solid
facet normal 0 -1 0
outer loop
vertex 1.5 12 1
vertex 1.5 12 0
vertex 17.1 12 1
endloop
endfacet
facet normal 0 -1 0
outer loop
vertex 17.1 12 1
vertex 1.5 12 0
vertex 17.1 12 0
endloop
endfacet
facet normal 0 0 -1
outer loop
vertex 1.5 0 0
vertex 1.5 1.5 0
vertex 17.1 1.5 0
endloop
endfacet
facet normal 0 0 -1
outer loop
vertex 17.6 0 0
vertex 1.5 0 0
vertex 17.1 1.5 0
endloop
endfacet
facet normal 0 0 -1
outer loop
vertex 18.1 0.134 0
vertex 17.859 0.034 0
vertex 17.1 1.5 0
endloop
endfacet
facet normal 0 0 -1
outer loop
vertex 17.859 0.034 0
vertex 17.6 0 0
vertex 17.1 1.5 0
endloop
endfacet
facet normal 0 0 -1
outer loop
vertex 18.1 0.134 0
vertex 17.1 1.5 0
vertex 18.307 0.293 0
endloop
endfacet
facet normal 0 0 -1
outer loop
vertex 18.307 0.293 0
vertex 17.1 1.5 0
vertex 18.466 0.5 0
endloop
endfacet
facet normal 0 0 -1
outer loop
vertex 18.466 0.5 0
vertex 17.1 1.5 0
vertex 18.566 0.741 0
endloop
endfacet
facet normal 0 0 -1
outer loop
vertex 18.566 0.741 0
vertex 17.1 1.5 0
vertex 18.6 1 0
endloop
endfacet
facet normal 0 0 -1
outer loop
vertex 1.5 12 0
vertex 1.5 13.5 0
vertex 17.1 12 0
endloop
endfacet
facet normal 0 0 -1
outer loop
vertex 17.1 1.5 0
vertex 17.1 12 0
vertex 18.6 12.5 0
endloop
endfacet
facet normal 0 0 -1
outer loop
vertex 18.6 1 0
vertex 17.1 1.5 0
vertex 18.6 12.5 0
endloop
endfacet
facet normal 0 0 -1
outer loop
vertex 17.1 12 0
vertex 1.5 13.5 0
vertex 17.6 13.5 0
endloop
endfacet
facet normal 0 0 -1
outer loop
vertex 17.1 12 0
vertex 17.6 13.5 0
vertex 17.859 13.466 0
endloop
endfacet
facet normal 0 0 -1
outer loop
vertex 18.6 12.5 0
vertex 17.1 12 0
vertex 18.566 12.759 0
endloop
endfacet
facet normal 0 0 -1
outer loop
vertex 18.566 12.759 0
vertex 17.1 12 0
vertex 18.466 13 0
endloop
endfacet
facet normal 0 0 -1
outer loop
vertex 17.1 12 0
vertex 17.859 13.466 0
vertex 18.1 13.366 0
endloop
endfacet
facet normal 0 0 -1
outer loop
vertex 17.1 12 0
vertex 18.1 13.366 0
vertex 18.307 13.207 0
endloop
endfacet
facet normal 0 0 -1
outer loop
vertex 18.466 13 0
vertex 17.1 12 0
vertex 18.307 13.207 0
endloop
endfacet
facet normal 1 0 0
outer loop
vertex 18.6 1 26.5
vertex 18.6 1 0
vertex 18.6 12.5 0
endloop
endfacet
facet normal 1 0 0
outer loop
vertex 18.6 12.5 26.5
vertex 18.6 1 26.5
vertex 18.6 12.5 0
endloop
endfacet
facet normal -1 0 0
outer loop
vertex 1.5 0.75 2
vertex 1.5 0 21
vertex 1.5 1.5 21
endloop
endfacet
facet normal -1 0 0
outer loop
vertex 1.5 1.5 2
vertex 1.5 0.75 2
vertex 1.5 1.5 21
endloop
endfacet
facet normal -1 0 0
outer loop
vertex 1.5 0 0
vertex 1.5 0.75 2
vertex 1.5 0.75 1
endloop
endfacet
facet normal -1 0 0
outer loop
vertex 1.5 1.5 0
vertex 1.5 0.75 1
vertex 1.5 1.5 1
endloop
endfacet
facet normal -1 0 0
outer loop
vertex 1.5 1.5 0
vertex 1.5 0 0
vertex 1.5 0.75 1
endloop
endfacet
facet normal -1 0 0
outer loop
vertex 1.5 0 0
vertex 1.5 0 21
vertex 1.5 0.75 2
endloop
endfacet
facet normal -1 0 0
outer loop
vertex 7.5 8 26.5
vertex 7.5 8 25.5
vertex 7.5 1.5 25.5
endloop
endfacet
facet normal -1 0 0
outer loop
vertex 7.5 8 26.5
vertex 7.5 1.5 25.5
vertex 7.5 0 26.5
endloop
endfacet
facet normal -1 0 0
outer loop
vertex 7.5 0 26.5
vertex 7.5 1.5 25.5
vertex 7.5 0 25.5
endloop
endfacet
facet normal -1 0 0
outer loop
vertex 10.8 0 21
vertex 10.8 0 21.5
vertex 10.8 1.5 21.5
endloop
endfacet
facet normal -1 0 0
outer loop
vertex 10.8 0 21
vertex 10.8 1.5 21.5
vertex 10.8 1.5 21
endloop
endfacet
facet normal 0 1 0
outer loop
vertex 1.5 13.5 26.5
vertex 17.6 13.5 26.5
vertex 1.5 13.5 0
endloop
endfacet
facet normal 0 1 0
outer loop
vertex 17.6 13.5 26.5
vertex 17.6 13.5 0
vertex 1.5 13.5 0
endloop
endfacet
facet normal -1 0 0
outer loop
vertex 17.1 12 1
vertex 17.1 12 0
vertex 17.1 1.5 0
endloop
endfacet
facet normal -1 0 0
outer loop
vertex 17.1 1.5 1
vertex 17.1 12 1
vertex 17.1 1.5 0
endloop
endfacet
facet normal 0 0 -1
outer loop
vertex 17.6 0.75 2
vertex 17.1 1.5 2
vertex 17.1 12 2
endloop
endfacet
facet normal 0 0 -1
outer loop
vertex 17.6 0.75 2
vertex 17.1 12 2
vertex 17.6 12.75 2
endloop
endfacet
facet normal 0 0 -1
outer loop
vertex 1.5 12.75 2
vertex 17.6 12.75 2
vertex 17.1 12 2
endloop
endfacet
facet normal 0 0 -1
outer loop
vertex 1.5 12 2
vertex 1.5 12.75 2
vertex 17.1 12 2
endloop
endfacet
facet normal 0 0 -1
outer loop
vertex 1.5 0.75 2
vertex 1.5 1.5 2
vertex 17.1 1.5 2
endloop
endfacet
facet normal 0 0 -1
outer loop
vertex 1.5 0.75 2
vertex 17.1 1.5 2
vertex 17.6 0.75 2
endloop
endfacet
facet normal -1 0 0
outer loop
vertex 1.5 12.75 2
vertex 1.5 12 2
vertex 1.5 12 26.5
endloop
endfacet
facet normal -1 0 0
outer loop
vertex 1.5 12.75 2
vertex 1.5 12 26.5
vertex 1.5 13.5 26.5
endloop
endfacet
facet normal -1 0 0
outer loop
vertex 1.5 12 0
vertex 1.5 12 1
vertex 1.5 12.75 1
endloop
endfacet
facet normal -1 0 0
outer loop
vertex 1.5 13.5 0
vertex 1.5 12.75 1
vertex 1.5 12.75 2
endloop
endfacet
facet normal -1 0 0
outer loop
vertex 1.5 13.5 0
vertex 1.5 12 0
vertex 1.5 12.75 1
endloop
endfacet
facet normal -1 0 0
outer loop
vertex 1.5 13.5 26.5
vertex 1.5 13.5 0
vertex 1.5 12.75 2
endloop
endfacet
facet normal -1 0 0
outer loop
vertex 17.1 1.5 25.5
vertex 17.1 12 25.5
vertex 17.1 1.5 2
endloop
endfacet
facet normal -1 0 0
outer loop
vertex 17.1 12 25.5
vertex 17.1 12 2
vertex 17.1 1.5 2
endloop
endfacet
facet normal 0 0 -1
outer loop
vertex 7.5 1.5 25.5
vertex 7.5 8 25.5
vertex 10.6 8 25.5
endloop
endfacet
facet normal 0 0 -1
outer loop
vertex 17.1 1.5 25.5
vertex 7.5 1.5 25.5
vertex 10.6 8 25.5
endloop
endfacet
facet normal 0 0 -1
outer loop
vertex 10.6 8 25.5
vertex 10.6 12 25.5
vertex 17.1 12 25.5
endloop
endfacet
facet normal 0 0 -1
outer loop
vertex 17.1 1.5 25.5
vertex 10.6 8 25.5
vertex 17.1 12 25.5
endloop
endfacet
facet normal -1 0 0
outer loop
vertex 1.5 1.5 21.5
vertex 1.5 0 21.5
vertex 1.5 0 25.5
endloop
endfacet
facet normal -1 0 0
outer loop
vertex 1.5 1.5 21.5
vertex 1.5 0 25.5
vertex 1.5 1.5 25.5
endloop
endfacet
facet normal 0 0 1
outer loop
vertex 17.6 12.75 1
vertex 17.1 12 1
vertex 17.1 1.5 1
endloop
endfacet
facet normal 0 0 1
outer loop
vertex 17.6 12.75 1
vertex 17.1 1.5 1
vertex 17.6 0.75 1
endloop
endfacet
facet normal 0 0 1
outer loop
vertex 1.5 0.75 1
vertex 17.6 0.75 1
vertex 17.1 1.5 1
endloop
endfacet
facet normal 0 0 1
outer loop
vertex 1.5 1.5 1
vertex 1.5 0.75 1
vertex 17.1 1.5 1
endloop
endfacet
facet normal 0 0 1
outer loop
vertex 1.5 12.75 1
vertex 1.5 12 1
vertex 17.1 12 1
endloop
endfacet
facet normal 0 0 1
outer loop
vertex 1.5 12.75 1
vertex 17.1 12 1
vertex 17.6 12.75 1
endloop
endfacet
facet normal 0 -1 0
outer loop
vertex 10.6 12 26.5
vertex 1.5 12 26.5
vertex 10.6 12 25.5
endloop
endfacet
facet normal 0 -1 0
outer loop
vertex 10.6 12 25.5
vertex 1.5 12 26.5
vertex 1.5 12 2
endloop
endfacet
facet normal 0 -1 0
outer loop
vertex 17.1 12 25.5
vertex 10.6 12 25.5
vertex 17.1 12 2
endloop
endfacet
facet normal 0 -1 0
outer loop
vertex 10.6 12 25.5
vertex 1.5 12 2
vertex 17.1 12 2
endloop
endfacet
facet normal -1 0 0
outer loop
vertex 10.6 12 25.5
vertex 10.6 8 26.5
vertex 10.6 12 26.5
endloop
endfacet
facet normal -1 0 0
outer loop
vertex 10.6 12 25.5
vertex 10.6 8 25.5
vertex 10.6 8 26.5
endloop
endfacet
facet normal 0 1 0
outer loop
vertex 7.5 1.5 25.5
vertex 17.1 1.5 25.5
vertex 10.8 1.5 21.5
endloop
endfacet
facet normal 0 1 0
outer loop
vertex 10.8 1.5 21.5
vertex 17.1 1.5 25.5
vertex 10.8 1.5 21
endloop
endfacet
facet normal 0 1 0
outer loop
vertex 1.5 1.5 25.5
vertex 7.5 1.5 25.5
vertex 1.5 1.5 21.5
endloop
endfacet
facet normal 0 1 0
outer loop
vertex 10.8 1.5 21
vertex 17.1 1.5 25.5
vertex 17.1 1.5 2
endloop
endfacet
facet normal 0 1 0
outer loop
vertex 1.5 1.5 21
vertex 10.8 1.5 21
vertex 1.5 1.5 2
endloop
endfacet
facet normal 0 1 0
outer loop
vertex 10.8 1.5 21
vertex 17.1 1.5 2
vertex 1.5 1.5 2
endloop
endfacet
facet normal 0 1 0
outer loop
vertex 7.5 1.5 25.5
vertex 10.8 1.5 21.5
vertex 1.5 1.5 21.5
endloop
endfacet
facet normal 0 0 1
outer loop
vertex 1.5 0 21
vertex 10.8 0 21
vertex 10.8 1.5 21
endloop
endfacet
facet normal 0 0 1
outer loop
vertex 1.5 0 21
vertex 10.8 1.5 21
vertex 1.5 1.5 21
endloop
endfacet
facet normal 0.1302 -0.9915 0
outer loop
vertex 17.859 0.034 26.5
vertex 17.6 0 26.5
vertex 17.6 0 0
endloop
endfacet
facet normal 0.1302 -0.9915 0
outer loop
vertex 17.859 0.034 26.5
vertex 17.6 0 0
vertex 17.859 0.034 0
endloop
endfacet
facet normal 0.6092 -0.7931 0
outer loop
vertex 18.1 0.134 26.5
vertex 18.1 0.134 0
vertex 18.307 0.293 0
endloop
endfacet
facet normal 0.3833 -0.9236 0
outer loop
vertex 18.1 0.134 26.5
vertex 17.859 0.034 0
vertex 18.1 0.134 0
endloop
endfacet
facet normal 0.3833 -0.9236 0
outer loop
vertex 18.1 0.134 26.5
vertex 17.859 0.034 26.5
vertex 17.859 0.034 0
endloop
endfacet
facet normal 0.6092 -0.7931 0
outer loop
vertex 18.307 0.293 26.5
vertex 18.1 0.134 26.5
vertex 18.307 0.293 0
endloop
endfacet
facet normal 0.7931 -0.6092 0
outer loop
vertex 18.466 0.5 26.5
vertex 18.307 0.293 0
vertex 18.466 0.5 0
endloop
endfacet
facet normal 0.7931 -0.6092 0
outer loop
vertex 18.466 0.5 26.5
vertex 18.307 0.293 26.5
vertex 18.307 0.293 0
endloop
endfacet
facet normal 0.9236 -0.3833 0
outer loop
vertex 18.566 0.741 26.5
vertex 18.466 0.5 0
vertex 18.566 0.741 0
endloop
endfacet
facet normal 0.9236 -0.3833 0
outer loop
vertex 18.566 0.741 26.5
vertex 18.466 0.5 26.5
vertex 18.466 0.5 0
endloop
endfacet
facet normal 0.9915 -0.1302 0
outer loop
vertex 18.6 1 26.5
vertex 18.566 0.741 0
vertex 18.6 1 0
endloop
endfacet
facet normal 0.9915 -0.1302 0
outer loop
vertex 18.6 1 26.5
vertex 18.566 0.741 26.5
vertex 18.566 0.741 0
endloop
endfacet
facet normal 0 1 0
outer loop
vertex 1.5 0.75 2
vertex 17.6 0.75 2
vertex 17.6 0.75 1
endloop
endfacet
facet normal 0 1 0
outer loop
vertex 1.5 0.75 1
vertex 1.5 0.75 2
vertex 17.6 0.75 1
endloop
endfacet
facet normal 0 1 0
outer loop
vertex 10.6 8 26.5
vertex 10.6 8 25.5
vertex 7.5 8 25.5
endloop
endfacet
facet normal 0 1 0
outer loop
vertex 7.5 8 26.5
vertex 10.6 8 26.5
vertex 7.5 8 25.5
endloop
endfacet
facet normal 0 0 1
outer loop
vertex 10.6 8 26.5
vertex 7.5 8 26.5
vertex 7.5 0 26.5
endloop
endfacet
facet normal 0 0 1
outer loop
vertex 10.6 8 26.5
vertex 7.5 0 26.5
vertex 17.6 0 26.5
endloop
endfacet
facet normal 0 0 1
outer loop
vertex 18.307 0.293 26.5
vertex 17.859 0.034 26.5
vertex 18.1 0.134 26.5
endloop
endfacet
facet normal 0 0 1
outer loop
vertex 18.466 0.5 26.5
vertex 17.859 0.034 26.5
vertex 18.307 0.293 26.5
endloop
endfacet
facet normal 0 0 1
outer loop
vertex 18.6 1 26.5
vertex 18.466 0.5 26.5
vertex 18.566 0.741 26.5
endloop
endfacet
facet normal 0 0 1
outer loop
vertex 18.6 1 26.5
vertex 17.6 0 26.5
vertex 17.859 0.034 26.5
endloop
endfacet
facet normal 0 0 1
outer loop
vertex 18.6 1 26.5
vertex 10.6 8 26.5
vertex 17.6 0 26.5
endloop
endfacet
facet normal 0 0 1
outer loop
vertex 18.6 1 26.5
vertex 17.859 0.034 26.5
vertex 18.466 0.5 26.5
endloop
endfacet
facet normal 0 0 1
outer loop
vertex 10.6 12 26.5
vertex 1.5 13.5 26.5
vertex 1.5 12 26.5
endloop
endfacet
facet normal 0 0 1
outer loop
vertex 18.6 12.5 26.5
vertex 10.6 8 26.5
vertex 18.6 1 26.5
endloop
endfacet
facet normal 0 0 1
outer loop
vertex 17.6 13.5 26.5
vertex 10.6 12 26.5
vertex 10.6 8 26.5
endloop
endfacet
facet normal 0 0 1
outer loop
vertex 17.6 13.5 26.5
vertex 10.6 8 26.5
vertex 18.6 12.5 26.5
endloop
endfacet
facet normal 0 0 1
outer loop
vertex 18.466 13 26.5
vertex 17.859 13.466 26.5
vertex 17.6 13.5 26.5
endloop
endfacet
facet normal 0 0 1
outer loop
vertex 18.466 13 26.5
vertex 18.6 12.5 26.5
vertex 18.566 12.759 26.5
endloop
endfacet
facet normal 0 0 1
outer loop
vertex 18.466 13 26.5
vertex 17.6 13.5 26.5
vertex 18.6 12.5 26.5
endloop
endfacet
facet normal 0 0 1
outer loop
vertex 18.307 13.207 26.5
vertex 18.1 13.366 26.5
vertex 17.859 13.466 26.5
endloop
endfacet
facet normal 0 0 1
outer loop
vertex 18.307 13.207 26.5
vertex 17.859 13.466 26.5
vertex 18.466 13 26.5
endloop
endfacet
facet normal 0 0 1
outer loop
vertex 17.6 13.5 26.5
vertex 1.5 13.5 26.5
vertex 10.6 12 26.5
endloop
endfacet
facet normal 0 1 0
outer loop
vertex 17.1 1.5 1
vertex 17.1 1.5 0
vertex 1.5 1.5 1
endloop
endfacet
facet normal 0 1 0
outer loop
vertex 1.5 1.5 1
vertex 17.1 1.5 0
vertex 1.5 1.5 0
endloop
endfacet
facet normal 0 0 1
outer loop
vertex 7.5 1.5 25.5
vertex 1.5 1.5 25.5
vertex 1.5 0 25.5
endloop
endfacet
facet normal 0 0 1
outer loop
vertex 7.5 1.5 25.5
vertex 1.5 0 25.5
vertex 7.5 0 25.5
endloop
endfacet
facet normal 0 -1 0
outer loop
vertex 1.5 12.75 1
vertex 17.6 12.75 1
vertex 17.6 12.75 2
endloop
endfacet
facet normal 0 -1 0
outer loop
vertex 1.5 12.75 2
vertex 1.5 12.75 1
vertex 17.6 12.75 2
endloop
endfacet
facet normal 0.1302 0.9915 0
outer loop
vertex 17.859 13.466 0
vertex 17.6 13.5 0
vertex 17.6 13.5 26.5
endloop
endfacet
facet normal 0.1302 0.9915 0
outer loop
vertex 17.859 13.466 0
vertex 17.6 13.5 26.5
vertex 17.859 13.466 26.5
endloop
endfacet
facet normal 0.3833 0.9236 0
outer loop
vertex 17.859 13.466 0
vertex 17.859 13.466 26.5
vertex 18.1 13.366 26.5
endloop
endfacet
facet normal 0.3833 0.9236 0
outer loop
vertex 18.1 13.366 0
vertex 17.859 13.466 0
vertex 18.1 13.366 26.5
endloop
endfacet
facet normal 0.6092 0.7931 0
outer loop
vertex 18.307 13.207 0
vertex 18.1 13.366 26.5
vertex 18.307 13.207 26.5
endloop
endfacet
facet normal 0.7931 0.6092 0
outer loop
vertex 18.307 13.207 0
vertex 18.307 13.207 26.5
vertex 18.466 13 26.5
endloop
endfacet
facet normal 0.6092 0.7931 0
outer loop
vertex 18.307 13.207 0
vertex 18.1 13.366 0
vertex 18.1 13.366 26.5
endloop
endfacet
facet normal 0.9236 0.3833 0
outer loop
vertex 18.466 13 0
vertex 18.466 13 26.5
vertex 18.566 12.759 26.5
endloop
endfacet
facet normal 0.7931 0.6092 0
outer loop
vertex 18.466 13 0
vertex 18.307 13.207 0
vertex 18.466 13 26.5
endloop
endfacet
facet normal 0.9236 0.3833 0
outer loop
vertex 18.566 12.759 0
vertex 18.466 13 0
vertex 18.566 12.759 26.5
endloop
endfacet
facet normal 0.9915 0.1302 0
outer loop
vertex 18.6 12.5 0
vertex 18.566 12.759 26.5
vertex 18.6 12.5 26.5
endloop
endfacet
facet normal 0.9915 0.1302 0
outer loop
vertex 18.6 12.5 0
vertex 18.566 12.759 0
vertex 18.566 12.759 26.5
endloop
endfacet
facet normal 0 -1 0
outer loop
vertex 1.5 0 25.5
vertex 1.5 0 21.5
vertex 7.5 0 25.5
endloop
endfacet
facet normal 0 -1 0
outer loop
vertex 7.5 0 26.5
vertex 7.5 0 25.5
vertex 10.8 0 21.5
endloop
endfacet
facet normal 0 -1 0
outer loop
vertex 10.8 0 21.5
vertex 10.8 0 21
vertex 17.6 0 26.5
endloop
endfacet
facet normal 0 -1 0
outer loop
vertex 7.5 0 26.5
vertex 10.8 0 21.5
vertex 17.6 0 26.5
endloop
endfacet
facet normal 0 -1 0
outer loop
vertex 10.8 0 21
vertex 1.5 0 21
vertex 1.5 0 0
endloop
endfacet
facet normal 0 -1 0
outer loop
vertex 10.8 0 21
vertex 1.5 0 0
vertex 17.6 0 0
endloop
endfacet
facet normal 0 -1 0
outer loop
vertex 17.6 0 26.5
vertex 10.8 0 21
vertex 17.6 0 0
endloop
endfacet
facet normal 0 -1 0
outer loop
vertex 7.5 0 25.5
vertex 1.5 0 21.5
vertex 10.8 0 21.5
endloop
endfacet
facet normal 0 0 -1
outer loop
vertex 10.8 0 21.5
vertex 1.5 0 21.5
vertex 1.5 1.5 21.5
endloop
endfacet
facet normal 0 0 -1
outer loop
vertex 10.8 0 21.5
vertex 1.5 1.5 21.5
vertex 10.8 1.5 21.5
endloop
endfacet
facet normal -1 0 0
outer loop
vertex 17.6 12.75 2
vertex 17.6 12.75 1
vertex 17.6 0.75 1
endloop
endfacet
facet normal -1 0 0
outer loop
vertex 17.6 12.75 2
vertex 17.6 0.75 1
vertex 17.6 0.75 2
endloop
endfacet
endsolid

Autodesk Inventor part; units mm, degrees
ref_plane "YZ Plane" through (0, 0, 0) normal (1, 0, 0) x (0, 1, 0)
ref_plane "XZ Plane" through (0, 0, 0) normal (0, 1, 0) x (-1, 0, 0)
ref_plane "XY Plane" through (0, 0, 0) normal (0, 0, 1) x (1, 0, 0)
sketch "스케치1" plane through (0, 0, 0) normal (0, 0, 1) x (1, 0, 0)
  line L0 (0, 0) -> (18.6, 0)
  line L1 (18.6, 0) -> (18.6, 13.5)
  line L2 (18.6, 13.5) -> (0, 13.5)
  line L3 (0, 13.5) -> (0, 0)
  line L4 (1.5, 12) -> (17.1, 12)
  line L5 (17.1, 12) -> (17.1, 1.5)
  line L6 (17.1, 1.5) -> (1.5, 1.5)
  line L7 (1.5, 1.5) -> (1.5, 12)
  dimension "d4" = 18.6
  dimension "d5" = 13.5
  dimension "d6" = 1.5
extrude "돌출1" add sketch "스케치1" along normal blind 25.5
sketch "스케치2" plane through (0, 0, 25.5) normal (0, 0, 1) x (1, 0, 0)
  line L0 (0, 0) -> (18.6, 0) projected
  line L1 (18.6, 0) -> (18.6, 13.5) projected
  line L2 (0, 0) -> (18.6, 0)
  line L3 (18.6, 0) -> (18.6, 8)
  line L4 (18.6, 8) -> (0, 8)
  line L5 (18.6, 13.5) -> (0, 13.5) projected
  line L6 (18.6, 8) -> (10.6, 8)
  line L7 (10.6, 8) -> (10.6, 13.5)
  line L8 (10.6, 13.5) -> (18.6, 13.5)
  line L9 (18.6, 13.5) -> (18.6, 8)
  line L10 (0, 13.5) -> (0, 0) projected
  line L11 (17.1, 12) -> (1.5, 12) projected
  line L12 (0, 13.5) -> (10.6, 13.5)
  line L13 (10.6, 13.5) -> (10.6, 12)
  line L14 (10.6, 12) -> (0, 12)
  line L15 (0, 12) -> (0, 13.5)
  line L16 (1.5, 1.5) -> (1.5, 12) projected
  line L17 (7.5, 8) -> (7.5, 0)
  point P0 (0, 12)
  dimension "d9" = 8
  dimension "d14" = 8
  dimension "d58" = 6
extrude "돌출2" add sketch "스케치2" along normal blind 1 contours L17 L4 L1 L0 | L10 L5 L7 L11 L14 | L4 L7 L5 L1
sketch "스케치3" plane through (0, 0, 0) normal (0, 0, -1) x (-1, 0, 0)
  line L0 (-17.1, 1.5) -> (-17.1, 12) projected
  line L1 (-17.1, 12) -> (-1.5, 12) projected
  line L2 (-1.5, 12) -> (-1.5, 1.5) projected
  line L3 (-1.5, 1.5) -> (-17.1, 1.5) projected
  line L4 (0, 0) -> (-18.6, 0) projected
  line L5 (0, 13.5) -> (0, 0) projected
  line L6 (-18.6, 13.5) -> (0, 13.5) projected
  line L7 (-18.6, 0) -> (-18.6, 13.5) projected
  line L8 (-18.6, 13.5) -> (0, 13.5) projected
  line L9 (0, 0) -> (-1.5, 0)
  line L10 (-1.5, 0) -> (-1.5, 13.5)
  line L11 (-1.5, 13.5) -> (0, 13.5)
  line L12 (0, 13.5) -> (0, 0)
  point P0 (-1.5, 6.75)
extrude "돌출3" cut sketch "스케치3" against normal up to next contours L2 L10 L6 L5 L4
sketch "스케치4" plane through (18.6, 0, 0) normal (0, -1, 0) x (1, 0, 0)
  line L0 (-7.8, 21) -> (-17.1, 21)
  line L1 (-17.1, 21) -> (-17.1, 21.5)
  line L2 (-17.1, 21.5) -> (-7.8, 21.5)
  line L3 (-7.8, 21.5) -> (-7.8, 21)
  line L4 (-17.1, 25.5) -> (-17.1, 0) projected
  line L5 (-11.1, 26.5) -> (0, 26.5) projected
  point P0 (-18.6, 0)
  point P1 (-17.1, 26.5)
  dimension "d17" = 0.5
  dimension "d18" = 9.3
  dimension "d19" = 5
extrude "돌출4" cut sketch "스케치4" against normal up to next
fillet "모깎기1" radius 1 2 edges at (18.6, 13.5, 13.25) (18.6, 0, 13.25)
sketch "스케치11" plane through (1.5, 12, 0) normal (-1, 0, 0) x (0, 0, 1)
  line L0 (1, 0.75) -> (2, 0.75)
  line L1 (2, 0.75) -> (2, -11.25)
  line L2 (2, -11.25) -> (1, -11.25)
  line L3 (1, -11.25) -> (1, 0.75)
  line L4 (0, -10.5) -> (0, 0) projected
  line L5 (0, 1.5) -> (26.5, 1.5) projected
  line L6 (21, -12) -> (0, -12) projected
  dimension "d43" = 1
  dimension "d44" = 1
  dimension "d45" = 0.75
  dimension "d46" = 0.75
extrude "돌출8" cut sketch "스케치11" against normal blind 16.1
equation "\"d6\" = t"
equation "\"t\" = 1.5"
properties part number "_3D 인쇄"
